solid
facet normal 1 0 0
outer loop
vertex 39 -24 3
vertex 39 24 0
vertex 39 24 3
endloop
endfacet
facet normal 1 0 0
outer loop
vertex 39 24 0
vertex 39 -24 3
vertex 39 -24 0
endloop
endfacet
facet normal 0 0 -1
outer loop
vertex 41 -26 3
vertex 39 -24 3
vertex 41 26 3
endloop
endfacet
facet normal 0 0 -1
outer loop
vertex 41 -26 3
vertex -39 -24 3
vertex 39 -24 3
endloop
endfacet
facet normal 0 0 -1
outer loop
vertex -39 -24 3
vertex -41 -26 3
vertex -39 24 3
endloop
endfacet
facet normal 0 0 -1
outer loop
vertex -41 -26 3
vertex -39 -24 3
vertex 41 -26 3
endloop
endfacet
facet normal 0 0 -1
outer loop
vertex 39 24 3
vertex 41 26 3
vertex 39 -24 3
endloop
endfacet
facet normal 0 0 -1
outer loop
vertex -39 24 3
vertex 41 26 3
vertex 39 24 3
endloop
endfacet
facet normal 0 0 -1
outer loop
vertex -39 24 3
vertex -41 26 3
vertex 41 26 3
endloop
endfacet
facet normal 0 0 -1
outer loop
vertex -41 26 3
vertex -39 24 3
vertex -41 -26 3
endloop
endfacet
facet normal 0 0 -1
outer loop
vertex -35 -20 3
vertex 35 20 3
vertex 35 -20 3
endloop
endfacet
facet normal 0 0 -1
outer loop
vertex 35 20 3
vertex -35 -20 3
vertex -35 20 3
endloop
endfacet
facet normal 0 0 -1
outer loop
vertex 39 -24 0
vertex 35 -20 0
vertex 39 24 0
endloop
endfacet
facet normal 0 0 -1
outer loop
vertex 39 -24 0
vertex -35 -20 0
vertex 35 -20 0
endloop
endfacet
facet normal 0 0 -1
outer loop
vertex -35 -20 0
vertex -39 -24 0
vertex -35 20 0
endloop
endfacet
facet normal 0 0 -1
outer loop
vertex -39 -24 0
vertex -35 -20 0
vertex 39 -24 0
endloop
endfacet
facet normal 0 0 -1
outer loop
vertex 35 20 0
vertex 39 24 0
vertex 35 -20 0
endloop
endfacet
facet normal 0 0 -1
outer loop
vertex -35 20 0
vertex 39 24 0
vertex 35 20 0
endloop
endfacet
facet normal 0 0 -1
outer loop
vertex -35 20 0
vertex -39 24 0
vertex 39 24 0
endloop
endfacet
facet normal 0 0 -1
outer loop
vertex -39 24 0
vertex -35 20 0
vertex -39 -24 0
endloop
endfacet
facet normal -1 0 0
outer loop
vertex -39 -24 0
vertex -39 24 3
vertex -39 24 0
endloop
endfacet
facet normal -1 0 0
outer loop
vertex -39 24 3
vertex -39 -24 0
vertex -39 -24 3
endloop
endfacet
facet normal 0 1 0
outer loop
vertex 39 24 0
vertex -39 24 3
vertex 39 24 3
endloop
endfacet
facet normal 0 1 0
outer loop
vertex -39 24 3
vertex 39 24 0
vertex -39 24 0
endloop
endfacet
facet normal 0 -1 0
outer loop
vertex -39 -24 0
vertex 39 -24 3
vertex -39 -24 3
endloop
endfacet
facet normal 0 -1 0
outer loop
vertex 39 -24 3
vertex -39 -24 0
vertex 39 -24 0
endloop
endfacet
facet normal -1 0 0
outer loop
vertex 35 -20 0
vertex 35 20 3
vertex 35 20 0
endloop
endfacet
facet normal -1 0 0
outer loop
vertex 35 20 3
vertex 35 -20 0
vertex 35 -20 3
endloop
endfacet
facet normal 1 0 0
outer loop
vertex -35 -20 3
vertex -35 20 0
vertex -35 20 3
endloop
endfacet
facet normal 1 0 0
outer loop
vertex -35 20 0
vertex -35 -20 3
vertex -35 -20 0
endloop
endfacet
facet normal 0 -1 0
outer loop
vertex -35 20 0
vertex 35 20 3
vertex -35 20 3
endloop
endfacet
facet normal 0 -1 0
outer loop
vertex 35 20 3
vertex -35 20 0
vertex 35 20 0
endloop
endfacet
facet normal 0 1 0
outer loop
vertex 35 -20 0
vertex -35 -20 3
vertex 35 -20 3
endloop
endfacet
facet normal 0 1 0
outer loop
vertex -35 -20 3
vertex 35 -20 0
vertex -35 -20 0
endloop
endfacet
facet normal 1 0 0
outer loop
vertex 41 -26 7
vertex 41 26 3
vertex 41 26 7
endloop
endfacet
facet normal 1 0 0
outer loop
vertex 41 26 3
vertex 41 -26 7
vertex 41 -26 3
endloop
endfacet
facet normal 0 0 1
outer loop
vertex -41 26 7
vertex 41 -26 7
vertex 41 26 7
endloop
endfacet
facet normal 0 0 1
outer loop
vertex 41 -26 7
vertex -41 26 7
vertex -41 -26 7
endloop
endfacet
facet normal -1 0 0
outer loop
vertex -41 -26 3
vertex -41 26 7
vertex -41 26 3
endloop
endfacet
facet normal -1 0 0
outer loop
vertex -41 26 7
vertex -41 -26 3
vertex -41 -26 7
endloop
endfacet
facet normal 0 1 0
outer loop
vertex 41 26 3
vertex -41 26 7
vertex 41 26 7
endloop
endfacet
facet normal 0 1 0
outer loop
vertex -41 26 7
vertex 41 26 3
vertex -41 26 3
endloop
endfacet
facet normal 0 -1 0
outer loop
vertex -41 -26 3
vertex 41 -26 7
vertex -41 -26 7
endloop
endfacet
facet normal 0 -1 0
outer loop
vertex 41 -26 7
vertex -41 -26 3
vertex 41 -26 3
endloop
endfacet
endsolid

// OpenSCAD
// Generated with SolidPython2 for OpenSCAD task-016
$fn = 64;

union() {
	translate(v = [-41.0, -26.0, 3]) {
		cube(size = [82, 52, 4]);
	}
	difference() {
		translate(v = [-39.0, -24.0, 0]) {
			cube(size = [78, 48, 3]);
		}
		translate(v = [-35.0, -20.0, 0]) {
			cube(size = [70, 40, 3]);
		}
	}
}
